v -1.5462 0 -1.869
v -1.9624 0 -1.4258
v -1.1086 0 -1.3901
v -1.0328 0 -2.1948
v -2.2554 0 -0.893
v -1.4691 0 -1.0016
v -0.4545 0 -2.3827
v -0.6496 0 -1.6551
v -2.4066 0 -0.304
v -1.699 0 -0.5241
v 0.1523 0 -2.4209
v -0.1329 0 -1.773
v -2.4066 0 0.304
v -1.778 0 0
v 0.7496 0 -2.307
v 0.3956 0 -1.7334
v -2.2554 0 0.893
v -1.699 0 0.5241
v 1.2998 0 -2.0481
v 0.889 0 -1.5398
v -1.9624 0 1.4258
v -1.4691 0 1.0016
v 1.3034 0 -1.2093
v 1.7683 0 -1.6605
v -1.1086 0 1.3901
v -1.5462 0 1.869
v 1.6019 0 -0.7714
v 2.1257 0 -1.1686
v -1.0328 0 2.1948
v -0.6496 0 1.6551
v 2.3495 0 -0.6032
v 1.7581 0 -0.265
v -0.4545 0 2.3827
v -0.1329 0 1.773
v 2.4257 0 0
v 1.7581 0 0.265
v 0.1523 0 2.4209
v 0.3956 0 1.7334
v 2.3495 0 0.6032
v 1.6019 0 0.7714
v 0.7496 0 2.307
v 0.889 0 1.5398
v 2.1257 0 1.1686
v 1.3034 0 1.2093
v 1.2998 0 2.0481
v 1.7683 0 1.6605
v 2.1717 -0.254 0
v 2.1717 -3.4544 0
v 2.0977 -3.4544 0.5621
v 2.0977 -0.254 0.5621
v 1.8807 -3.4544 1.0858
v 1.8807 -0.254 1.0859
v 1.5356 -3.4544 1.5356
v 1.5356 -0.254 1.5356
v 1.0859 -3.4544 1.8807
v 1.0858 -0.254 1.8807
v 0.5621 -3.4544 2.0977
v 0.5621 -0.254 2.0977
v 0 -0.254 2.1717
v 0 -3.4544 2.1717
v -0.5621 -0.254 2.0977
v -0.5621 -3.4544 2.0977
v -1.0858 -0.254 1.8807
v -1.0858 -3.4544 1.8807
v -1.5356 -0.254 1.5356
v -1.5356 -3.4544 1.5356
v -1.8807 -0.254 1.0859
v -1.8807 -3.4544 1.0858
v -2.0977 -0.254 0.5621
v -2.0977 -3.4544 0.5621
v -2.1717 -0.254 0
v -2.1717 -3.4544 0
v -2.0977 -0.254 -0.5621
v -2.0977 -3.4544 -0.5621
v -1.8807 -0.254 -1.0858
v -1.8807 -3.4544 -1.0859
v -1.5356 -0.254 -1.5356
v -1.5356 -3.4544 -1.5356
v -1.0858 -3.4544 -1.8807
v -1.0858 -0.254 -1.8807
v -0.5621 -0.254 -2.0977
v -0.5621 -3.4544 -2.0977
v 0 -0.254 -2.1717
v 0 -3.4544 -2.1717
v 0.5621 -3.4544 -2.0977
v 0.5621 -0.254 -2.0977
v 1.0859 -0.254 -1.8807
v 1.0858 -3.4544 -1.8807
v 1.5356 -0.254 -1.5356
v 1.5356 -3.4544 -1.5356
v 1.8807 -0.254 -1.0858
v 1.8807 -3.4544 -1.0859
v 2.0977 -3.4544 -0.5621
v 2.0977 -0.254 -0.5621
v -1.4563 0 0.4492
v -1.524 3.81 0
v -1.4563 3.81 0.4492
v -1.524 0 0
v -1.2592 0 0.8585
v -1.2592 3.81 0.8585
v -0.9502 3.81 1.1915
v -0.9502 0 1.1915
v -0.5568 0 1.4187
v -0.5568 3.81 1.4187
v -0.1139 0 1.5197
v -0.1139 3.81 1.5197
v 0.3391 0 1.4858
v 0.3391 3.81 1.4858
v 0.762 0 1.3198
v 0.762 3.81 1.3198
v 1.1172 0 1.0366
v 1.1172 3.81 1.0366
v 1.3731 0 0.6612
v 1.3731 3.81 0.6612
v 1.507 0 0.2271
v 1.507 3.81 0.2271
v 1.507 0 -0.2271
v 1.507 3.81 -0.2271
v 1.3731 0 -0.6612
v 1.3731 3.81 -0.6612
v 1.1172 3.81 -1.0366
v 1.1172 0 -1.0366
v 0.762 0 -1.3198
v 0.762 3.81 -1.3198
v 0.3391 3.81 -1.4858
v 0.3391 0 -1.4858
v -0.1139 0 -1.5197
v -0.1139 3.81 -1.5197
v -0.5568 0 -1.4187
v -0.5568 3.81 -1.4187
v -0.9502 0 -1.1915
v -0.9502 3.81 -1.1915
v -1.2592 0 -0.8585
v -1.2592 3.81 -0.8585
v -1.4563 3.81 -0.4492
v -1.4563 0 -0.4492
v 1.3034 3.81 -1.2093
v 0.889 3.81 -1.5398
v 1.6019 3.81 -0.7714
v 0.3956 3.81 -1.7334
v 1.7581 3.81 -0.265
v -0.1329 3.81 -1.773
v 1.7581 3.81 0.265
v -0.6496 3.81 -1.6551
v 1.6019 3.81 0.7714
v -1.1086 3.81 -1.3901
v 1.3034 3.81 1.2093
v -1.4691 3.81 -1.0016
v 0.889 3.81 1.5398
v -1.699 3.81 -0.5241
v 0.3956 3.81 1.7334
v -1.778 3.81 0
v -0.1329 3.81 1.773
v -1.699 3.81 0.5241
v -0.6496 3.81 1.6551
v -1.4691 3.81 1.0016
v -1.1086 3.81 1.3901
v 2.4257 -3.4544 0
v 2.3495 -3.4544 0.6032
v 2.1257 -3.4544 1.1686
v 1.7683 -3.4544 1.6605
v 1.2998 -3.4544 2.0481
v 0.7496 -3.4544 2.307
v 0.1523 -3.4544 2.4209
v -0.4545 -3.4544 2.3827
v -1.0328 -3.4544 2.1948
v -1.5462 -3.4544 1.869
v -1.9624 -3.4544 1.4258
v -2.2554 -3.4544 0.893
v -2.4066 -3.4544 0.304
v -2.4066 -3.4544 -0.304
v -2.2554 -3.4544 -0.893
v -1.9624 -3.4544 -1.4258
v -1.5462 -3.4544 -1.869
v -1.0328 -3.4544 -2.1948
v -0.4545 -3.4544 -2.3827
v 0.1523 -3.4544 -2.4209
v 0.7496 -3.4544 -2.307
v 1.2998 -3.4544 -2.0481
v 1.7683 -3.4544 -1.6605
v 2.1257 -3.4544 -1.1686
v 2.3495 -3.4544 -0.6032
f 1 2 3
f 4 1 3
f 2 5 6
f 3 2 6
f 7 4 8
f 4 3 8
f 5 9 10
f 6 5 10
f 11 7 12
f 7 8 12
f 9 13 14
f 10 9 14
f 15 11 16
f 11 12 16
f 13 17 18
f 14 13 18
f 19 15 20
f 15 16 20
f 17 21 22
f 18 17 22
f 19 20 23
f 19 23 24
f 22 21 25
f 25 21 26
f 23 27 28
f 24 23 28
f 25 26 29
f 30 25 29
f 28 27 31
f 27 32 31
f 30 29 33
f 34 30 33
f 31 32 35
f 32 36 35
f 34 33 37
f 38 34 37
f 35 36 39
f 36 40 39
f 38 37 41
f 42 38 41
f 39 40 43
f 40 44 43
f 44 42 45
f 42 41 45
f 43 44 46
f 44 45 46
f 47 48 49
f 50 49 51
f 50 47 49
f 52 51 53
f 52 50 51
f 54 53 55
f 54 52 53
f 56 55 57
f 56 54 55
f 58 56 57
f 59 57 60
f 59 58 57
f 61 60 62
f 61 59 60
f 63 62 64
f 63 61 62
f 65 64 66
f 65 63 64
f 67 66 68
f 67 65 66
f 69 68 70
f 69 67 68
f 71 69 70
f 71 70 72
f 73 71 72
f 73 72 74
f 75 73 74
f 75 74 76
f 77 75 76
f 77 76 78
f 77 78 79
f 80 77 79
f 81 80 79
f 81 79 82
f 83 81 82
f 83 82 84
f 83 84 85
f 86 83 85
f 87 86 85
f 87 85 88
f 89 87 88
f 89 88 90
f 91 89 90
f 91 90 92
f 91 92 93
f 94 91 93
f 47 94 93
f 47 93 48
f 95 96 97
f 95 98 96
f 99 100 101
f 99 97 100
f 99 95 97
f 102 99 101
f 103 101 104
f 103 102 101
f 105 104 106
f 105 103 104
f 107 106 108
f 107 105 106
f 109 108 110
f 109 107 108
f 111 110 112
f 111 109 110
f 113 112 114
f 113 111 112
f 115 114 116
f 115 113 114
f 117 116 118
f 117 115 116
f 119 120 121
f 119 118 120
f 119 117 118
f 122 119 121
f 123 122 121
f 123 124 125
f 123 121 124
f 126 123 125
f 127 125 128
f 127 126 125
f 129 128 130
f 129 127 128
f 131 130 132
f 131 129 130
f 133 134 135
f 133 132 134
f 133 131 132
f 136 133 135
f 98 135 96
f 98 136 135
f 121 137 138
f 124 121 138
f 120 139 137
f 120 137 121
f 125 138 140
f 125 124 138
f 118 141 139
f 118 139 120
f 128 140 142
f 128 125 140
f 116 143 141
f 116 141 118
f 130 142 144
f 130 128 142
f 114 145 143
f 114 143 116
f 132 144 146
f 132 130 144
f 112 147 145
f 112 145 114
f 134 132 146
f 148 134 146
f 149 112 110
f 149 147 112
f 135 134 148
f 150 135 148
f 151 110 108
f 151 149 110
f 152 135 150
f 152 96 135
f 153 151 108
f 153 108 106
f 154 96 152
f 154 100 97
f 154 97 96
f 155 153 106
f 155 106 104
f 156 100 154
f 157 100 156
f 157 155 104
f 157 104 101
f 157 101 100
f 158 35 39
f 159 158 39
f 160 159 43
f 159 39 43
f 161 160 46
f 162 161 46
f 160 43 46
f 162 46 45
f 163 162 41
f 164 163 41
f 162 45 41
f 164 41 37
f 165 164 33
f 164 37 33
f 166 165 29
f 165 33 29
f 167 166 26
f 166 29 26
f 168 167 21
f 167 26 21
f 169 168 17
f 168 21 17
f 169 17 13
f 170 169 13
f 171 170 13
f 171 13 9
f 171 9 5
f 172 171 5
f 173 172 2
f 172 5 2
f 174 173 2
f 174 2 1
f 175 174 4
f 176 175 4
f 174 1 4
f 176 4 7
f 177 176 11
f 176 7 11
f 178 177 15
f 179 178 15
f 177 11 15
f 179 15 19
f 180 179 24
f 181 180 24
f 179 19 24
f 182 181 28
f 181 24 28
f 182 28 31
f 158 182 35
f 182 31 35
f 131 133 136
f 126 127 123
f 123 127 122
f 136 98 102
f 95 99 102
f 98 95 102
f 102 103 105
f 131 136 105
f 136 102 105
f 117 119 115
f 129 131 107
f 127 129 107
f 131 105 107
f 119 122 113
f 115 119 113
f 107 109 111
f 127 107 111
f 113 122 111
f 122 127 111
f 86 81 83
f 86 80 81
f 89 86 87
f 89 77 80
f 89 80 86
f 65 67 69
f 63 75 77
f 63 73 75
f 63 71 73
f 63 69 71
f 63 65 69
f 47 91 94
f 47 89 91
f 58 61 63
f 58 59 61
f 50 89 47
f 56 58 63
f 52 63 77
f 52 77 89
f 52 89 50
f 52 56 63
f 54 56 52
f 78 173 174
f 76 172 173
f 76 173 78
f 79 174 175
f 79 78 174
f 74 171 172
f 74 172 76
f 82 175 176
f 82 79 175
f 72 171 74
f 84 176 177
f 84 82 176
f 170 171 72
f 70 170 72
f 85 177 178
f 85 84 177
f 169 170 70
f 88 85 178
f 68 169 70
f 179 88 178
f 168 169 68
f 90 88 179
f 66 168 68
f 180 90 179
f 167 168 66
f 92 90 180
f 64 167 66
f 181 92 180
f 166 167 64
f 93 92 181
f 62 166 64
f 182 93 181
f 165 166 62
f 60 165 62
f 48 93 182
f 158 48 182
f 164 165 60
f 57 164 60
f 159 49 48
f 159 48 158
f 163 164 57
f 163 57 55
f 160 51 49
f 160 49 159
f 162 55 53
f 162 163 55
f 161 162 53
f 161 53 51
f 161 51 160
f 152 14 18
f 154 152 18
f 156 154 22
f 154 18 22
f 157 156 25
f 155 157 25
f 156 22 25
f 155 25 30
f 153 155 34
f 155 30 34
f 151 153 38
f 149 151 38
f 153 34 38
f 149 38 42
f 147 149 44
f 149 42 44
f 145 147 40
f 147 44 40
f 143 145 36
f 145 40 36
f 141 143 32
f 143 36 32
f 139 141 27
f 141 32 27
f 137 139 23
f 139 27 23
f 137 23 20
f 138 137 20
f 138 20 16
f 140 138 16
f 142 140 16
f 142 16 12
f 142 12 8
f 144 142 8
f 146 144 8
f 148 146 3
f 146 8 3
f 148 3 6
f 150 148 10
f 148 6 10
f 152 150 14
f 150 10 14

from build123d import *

# Parameters (mm, degrees)
F0_R     = 2.4257
F1_DEPTH = 3.4544
F2_T     = -0.254
F3_R     = 1.778
F4_DEPTH = 3.81
F5_T     = -0.254


with BuildPart() as f1:
    # F0 (on Front) → F1 (new body)
    with BuildSketch(Plane.XZ):
        Circle(F0_R)
    extrude(amount=F1_DEPTH)

    # F2
    f2_openings = [f1.faces().sort_by_distance(p)[0] for p in [
        (0, -3.4544, 0),
    ]]
    offset(amount=F2_T, openings=f2_openings)

    # F3 (on face) → F4 (join)
    with BuildSketch(Plane(origin=(0, 0, 0), x_dir=(-1, 0, 0), z_dir=(0, 1, 0))):
        Circle(F3_R)
    extrude(amount=F4_DEPTH)

    # F5
    f5_openings = [f1.faces().sort_by_distance(p)[0] for p in [
        (0, 3.81, 0),
    ]]
    offset(amount=F5_T, openings=f5_openings, kind=Kind.INTERSECTION)


solid = f1.part
